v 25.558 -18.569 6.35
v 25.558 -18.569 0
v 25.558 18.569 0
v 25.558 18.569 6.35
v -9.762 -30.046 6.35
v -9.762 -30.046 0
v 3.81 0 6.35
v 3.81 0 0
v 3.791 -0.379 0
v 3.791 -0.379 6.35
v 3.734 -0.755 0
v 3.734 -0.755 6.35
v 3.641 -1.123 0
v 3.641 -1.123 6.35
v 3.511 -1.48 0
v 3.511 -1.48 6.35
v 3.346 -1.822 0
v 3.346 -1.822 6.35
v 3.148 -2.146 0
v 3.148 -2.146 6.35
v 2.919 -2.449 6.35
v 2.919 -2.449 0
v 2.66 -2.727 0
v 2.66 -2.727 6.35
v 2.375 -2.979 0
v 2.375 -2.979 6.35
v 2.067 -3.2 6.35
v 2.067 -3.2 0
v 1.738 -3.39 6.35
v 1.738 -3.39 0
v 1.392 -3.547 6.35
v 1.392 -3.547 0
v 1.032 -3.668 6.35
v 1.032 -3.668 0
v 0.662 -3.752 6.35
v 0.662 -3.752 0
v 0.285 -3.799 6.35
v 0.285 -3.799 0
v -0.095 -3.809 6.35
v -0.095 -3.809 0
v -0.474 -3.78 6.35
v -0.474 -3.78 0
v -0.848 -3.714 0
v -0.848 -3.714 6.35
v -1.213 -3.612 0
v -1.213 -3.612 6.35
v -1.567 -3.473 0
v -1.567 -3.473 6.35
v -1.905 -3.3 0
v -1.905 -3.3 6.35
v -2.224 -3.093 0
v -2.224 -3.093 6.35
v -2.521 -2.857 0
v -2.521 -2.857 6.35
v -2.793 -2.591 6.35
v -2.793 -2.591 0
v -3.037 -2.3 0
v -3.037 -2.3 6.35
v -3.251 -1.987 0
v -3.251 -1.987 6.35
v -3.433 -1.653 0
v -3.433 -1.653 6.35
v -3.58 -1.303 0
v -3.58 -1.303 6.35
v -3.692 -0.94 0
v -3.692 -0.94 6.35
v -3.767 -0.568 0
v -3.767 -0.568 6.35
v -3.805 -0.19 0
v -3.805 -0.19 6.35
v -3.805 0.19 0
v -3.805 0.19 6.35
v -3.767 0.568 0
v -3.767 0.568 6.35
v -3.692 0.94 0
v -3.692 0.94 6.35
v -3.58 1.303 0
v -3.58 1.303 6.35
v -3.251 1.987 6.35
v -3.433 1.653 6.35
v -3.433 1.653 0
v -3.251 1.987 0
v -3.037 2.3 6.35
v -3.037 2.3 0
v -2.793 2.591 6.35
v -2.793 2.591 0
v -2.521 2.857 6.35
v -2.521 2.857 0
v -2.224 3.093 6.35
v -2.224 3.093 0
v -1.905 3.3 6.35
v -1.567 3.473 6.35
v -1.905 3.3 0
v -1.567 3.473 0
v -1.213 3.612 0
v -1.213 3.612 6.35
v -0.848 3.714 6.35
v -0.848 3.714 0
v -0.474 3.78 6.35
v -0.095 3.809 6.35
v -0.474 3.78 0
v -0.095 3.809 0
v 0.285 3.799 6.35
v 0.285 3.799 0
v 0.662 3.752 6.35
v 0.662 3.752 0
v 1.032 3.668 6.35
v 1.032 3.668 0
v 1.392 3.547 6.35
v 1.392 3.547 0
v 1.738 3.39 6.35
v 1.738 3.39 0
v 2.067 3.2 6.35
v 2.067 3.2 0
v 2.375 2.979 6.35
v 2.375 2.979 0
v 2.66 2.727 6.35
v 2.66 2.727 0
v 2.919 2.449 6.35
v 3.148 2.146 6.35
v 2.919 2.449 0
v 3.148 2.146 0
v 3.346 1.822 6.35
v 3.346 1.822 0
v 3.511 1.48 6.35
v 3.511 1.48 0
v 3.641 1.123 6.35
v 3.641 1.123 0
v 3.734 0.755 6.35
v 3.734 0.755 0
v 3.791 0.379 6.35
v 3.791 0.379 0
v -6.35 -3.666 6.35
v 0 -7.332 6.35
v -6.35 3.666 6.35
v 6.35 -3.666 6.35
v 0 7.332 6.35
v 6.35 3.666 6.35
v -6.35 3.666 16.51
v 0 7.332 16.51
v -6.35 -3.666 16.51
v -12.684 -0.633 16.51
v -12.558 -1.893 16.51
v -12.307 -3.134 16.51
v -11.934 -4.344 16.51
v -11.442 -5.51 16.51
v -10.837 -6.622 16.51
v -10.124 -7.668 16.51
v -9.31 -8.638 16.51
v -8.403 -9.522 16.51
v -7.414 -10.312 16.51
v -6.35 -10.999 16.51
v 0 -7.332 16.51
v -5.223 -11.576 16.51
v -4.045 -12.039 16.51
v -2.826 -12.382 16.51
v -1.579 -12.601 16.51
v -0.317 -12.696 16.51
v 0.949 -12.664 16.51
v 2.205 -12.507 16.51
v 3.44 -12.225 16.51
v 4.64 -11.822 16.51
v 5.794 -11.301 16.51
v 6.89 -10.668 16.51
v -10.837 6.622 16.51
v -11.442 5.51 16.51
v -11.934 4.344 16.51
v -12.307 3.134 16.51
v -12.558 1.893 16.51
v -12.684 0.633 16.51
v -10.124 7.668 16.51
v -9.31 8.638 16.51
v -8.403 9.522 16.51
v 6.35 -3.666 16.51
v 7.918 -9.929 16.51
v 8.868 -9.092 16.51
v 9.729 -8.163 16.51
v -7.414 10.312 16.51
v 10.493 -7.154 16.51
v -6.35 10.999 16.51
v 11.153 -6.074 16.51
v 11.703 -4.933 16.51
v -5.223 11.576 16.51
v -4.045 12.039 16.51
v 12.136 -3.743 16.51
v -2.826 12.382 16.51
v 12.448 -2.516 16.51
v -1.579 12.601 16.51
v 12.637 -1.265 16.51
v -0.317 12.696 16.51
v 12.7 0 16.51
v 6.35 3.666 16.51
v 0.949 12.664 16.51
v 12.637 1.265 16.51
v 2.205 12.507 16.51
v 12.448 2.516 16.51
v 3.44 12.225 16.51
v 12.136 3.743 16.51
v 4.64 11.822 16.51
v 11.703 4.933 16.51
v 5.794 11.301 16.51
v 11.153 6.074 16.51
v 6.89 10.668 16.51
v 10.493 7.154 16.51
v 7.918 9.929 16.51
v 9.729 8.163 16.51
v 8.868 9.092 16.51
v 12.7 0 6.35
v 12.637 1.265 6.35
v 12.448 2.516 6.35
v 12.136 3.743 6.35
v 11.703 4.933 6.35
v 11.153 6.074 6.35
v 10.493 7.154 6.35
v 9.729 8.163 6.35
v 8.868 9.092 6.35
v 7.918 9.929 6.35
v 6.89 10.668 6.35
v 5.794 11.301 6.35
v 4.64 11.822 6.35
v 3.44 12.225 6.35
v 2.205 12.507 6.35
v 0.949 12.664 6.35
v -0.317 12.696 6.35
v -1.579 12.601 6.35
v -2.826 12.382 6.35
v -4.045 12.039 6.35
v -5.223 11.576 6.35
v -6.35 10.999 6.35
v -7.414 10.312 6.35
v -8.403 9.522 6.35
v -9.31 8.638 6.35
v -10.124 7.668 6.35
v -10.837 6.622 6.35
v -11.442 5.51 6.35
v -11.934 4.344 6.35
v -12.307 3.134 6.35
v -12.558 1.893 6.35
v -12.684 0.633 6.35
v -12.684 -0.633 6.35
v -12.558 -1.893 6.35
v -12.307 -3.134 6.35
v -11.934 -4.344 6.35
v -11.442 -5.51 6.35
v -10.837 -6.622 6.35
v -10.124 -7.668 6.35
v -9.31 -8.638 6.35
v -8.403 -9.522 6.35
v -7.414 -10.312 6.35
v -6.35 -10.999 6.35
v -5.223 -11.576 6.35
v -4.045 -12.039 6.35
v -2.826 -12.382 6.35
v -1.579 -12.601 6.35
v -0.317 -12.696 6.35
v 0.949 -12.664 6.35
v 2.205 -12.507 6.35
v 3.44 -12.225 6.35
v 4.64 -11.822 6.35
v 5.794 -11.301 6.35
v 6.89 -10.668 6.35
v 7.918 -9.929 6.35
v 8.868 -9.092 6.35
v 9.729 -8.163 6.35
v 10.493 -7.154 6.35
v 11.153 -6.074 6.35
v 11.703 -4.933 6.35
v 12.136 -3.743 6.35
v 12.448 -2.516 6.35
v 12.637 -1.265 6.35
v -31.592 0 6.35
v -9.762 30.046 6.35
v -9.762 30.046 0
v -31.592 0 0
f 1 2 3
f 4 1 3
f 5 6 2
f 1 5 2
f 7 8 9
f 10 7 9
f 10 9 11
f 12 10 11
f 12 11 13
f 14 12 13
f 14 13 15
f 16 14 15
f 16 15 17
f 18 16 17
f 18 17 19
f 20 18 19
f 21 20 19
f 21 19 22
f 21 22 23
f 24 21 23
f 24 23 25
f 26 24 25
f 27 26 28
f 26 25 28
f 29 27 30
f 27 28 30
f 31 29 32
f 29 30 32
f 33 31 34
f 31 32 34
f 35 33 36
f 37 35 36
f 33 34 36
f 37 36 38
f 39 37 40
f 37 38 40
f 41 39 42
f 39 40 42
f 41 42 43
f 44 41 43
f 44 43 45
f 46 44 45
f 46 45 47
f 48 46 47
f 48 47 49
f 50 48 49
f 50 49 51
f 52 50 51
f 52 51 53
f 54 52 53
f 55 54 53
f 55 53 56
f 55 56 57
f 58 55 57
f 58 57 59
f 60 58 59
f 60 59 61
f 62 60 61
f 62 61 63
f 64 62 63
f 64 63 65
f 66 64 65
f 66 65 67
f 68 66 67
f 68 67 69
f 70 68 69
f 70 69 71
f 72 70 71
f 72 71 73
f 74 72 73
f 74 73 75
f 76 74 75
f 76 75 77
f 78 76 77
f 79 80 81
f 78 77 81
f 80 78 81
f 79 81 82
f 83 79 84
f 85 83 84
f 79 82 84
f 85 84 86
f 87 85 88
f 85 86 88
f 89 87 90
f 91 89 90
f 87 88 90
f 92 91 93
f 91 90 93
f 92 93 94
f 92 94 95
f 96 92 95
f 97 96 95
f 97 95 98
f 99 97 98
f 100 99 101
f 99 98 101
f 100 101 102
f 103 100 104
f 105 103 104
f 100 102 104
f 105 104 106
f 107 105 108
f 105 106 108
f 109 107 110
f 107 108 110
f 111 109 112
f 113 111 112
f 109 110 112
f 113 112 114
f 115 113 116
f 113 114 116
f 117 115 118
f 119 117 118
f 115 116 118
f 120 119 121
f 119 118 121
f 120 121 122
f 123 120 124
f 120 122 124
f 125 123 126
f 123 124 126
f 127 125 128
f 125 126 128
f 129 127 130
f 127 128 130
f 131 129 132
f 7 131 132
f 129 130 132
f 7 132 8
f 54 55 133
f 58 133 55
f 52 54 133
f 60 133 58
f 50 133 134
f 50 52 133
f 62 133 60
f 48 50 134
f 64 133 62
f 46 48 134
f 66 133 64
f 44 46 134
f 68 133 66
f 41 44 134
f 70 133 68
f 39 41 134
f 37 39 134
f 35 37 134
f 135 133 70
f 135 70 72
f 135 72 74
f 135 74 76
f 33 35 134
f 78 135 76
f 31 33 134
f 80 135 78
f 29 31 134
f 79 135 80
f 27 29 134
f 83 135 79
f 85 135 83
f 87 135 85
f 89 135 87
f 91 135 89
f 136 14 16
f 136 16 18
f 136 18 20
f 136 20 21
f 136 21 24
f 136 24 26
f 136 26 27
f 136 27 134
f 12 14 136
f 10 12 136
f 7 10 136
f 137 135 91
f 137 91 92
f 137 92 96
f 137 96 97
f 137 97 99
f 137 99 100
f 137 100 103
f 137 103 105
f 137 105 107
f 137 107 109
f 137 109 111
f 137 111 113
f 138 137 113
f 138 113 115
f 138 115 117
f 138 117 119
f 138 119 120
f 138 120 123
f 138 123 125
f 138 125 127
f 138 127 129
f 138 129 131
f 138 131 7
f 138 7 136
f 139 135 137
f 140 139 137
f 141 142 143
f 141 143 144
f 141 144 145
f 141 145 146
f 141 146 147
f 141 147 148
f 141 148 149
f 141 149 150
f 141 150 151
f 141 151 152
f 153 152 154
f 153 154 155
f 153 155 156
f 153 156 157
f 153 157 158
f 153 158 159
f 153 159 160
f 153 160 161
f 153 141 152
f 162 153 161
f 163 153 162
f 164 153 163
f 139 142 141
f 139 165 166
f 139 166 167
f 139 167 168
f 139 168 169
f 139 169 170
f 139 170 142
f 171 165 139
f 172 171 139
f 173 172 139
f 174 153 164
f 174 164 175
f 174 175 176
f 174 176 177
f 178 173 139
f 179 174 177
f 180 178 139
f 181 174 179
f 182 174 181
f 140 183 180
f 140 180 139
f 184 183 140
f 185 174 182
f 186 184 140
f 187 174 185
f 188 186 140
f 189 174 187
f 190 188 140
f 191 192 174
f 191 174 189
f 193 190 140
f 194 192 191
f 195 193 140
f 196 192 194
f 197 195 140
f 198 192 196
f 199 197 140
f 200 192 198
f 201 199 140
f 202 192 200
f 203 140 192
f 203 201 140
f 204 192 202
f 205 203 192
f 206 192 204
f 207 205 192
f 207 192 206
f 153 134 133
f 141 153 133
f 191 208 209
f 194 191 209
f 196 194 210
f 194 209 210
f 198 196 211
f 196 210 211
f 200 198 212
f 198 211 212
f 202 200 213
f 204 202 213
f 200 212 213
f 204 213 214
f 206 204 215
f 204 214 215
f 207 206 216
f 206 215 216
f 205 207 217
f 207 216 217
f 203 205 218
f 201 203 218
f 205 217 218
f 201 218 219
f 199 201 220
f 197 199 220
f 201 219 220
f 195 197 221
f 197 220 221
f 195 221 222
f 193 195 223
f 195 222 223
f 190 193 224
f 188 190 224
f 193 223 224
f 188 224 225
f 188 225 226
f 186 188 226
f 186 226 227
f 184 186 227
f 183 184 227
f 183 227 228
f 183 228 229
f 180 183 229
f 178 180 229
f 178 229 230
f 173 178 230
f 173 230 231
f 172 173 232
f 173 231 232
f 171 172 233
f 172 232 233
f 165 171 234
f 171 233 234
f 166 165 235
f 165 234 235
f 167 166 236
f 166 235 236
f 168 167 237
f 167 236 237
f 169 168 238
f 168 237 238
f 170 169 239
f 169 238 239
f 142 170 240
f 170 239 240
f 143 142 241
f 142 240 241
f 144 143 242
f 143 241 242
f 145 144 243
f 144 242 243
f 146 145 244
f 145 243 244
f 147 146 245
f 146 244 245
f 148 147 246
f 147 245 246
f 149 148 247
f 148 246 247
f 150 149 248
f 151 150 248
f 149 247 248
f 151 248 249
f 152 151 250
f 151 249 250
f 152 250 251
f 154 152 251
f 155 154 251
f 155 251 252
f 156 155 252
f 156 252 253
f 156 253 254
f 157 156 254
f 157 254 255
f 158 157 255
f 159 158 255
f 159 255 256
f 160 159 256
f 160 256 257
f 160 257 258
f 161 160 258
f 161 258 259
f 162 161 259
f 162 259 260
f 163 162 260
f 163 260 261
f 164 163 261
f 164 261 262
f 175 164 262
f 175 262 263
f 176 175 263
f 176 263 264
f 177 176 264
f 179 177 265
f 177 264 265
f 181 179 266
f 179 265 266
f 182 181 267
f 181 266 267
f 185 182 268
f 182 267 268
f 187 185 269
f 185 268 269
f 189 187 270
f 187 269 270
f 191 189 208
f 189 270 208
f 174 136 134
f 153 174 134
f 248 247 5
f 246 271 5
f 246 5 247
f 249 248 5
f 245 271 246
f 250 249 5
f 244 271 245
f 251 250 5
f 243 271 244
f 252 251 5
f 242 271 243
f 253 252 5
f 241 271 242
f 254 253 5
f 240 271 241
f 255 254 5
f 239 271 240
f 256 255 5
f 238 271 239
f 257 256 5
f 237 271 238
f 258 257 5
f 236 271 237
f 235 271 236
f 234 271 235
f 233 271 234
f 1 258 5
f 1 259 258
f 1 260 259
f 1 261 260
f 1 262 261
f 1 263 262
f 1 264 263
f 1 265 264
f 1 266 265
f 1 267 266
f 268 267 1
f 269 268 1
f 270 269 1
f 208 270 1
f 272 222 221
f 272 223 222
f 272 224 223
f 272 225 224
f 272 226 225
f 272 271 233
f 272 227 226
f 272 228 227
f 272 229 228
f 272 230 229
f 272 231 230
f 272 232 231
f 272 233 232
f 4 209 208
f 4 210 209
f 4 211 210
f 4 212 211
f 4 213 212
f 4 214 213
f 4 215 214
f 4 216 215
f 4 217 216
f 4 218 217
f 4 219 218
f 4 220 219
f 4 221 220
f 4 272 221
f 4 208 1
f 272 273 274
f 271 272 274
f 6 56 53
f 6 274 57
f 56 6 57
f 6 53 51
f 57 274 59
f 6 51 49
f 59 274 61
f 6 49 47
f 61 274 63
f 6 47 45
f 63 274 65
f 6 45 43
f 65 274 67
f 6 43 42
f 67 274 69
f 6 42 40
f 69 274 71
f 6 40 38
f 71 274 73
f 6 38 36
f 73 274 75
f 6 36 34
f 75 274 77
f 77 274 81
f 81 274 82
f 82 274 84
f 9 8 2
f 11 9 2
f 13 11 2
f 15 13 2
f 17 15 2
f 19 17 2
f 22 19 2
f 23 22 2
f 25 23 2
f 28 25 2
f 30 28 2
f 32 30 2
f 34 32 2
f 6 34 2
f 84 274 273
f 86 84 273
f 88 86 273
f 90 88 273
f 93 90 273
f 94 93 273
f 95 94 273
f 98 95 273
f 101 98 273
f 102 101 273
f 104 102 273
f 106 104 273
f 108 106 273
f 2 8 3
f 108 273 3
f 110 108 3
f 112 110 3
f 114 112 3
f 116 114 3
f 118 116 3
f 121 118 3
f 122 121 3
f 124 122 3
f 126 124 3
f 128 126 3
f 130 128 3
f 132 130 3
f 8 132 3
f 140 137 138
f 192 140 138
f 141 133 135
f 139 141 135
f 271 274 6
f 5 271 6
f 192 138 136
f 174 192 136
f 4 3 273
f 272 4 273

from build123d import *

# Parameters (mm, degrees)
F1_DEPTH = 6.35
F2_R     = 12.7
F3_DEPTH = 10.16
F4_R     = 3.81
F5_DEPTH = 25.4


with BuildPart() as f1:
    # F0 (on Top) → F1 (new body)
    with BuildSketch(Plane.XY):
        Polygon((25.558257, -18.569161), (25.558257, 18.569161), (-9.762385, 30.045533), (-31.591743, 0), (-9.762385, -30.045533), align=None)
    extrude(amount=F1_DEPTH)

    # F2 (on face) → F3 (join)
    with BuildSketch(Plane.XY.offset(6.35)):
        Circle(F2_R)
        Polygon((0, 7.332348), (6.35, 3.666174), (6.35, -3.666174), (0, -7.332348), (-6.35, -3.666174), (-6.35, 3.666174), align=None, mode=Mode.SUBTRACT)
    extrude(amount=F3_DEPTH)

    # F4 (on face) → F5 (cut)
    with BuildSketch(Plane(origin=(0, 0, 0), x_dir=(1, 0, 0), z_dir=(0, 0, -1))):
        Circle(F4_R)
    extrude(amount=-F5_DEPTH, mode=Mode.SUBTRACT)


solid = f1.part
